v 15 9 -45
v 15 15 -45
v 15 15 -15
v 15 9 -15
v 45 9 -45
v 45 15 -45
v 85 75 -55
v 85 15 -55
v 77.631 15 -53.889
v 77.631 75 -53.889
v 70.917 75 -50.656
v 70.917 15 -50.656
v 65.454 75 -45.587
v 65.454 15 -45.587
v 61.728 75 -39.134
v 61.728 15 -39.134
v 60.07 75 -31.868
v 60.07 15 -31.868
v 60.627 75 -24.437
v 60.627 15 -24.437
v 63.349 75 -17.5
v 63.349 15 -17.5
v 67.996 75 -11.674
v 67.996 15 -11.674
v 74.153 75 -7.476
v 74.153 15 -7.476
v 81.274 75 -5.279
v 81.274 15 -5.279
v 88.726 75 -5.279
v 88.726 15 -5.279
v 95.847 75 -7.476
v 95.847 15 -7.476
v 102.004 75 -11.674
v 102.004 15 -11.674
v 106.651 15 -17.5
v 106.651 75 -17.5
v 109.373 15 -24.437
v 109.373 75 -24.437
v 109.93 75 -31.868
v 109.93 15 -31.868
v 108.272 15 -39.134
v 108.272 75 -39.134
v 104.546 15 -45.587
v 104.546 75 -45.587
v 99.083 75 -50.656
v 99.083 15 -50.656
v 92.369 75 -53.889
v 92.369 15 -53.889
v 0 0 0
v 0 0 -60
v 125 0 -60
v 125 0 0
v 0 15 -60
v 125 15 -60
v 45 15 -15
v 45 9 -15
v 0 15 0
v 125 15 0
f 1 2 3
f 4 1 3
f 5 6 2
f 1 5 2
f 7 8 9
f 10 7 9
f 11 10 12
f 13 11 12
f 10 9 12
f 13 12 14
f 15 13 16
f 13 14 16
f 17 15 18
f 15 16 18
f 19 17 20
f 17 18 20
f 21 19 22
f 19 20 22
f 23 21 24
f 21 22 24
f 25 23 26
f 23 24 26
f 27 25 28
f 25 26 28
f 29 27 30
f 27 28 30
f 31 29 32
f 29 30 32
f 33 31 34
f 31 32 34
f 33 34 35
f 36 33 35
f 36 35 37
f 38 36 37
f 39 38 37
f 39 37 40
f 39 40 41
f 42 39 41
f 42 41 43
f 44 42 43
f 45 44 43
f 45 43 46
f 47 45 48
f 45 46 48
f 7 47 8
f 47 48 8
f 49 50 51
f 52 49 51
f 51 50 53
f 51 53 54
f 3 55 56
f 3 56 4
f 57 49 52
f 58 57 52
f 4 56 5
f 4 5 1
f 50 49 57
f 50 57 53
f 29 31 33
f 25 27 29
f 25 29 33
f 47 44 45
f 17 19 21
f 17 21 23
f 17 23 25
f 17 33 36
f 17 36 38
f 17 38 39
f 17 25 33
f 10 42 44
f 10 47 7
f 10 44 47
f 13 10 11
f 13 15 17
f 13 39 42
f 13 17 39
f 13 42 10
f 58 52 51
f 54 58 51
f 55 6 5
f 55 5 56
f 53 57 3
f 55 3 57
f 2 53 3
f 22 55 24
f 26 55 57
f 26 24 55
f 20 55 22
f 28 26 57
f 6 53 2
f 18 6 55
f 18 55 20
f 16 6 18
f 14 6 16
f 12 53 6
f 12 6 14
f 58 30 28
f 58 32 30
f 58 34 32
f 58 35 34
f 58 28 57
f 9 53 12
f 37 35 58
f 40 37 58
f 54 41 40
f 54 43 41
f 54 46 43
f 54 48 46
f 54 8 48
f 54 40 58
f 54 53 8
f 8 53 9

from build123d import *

# Parameters (mm, degrees)
SKETCH1_W          = 125
SKETCH1_H          = 60
EXTRUDE1_DEPTH     = 15
SKETCH2_R          = 25
EXTRUDE2_DEPTH     = 60
SKETCH3_W          = 30
SKETCH3_H          = 30
CUT_EXTRUDE1_DEPTH = 6


with BuildPart() as part:
    # Sketch1 → Extrude1 (new body)
    with BuildSketch(Plane(origin=(0, 0, 0), x_dir=(1, 0, 0), z_dir=(0, 1, 0))):
        with Locations((62.5, 30)):
            Rectangle(SKETCH1_W, SKETCH1_H)
    extrude(amount=EXTRUDE1_DEPTH)

    # Sketch2 → Extrude2 (add)
    with BuildSketch(Plane(origin=(0, 15, 0), x_dir=(-1, 0, 0), z_dir=(0, 1, 0))):
        with Locations(Location((-85, -30, 0), (0, 0, 270))):  # turned: the seam where the file's is
            Circle(SKETCH2_R)
    extrude(amount=EXTRUDE2_DEPTH)

    # Sketch3 → Cut-Extrude1 (cut)
    with BuildSketch(Plane(origin=(0, 15, 0), x_dir=(-1, 0, 0), z_dir=(0, 1, 0))):
        with Locations((-30, -30)):
            Rectangle(SKETCH3_W, SKETCH3_H)
    extrude(amount=-CUT_EXTRUDE1_DEPTH, mode=Mode.SUBTRACT)


solid = part.part
